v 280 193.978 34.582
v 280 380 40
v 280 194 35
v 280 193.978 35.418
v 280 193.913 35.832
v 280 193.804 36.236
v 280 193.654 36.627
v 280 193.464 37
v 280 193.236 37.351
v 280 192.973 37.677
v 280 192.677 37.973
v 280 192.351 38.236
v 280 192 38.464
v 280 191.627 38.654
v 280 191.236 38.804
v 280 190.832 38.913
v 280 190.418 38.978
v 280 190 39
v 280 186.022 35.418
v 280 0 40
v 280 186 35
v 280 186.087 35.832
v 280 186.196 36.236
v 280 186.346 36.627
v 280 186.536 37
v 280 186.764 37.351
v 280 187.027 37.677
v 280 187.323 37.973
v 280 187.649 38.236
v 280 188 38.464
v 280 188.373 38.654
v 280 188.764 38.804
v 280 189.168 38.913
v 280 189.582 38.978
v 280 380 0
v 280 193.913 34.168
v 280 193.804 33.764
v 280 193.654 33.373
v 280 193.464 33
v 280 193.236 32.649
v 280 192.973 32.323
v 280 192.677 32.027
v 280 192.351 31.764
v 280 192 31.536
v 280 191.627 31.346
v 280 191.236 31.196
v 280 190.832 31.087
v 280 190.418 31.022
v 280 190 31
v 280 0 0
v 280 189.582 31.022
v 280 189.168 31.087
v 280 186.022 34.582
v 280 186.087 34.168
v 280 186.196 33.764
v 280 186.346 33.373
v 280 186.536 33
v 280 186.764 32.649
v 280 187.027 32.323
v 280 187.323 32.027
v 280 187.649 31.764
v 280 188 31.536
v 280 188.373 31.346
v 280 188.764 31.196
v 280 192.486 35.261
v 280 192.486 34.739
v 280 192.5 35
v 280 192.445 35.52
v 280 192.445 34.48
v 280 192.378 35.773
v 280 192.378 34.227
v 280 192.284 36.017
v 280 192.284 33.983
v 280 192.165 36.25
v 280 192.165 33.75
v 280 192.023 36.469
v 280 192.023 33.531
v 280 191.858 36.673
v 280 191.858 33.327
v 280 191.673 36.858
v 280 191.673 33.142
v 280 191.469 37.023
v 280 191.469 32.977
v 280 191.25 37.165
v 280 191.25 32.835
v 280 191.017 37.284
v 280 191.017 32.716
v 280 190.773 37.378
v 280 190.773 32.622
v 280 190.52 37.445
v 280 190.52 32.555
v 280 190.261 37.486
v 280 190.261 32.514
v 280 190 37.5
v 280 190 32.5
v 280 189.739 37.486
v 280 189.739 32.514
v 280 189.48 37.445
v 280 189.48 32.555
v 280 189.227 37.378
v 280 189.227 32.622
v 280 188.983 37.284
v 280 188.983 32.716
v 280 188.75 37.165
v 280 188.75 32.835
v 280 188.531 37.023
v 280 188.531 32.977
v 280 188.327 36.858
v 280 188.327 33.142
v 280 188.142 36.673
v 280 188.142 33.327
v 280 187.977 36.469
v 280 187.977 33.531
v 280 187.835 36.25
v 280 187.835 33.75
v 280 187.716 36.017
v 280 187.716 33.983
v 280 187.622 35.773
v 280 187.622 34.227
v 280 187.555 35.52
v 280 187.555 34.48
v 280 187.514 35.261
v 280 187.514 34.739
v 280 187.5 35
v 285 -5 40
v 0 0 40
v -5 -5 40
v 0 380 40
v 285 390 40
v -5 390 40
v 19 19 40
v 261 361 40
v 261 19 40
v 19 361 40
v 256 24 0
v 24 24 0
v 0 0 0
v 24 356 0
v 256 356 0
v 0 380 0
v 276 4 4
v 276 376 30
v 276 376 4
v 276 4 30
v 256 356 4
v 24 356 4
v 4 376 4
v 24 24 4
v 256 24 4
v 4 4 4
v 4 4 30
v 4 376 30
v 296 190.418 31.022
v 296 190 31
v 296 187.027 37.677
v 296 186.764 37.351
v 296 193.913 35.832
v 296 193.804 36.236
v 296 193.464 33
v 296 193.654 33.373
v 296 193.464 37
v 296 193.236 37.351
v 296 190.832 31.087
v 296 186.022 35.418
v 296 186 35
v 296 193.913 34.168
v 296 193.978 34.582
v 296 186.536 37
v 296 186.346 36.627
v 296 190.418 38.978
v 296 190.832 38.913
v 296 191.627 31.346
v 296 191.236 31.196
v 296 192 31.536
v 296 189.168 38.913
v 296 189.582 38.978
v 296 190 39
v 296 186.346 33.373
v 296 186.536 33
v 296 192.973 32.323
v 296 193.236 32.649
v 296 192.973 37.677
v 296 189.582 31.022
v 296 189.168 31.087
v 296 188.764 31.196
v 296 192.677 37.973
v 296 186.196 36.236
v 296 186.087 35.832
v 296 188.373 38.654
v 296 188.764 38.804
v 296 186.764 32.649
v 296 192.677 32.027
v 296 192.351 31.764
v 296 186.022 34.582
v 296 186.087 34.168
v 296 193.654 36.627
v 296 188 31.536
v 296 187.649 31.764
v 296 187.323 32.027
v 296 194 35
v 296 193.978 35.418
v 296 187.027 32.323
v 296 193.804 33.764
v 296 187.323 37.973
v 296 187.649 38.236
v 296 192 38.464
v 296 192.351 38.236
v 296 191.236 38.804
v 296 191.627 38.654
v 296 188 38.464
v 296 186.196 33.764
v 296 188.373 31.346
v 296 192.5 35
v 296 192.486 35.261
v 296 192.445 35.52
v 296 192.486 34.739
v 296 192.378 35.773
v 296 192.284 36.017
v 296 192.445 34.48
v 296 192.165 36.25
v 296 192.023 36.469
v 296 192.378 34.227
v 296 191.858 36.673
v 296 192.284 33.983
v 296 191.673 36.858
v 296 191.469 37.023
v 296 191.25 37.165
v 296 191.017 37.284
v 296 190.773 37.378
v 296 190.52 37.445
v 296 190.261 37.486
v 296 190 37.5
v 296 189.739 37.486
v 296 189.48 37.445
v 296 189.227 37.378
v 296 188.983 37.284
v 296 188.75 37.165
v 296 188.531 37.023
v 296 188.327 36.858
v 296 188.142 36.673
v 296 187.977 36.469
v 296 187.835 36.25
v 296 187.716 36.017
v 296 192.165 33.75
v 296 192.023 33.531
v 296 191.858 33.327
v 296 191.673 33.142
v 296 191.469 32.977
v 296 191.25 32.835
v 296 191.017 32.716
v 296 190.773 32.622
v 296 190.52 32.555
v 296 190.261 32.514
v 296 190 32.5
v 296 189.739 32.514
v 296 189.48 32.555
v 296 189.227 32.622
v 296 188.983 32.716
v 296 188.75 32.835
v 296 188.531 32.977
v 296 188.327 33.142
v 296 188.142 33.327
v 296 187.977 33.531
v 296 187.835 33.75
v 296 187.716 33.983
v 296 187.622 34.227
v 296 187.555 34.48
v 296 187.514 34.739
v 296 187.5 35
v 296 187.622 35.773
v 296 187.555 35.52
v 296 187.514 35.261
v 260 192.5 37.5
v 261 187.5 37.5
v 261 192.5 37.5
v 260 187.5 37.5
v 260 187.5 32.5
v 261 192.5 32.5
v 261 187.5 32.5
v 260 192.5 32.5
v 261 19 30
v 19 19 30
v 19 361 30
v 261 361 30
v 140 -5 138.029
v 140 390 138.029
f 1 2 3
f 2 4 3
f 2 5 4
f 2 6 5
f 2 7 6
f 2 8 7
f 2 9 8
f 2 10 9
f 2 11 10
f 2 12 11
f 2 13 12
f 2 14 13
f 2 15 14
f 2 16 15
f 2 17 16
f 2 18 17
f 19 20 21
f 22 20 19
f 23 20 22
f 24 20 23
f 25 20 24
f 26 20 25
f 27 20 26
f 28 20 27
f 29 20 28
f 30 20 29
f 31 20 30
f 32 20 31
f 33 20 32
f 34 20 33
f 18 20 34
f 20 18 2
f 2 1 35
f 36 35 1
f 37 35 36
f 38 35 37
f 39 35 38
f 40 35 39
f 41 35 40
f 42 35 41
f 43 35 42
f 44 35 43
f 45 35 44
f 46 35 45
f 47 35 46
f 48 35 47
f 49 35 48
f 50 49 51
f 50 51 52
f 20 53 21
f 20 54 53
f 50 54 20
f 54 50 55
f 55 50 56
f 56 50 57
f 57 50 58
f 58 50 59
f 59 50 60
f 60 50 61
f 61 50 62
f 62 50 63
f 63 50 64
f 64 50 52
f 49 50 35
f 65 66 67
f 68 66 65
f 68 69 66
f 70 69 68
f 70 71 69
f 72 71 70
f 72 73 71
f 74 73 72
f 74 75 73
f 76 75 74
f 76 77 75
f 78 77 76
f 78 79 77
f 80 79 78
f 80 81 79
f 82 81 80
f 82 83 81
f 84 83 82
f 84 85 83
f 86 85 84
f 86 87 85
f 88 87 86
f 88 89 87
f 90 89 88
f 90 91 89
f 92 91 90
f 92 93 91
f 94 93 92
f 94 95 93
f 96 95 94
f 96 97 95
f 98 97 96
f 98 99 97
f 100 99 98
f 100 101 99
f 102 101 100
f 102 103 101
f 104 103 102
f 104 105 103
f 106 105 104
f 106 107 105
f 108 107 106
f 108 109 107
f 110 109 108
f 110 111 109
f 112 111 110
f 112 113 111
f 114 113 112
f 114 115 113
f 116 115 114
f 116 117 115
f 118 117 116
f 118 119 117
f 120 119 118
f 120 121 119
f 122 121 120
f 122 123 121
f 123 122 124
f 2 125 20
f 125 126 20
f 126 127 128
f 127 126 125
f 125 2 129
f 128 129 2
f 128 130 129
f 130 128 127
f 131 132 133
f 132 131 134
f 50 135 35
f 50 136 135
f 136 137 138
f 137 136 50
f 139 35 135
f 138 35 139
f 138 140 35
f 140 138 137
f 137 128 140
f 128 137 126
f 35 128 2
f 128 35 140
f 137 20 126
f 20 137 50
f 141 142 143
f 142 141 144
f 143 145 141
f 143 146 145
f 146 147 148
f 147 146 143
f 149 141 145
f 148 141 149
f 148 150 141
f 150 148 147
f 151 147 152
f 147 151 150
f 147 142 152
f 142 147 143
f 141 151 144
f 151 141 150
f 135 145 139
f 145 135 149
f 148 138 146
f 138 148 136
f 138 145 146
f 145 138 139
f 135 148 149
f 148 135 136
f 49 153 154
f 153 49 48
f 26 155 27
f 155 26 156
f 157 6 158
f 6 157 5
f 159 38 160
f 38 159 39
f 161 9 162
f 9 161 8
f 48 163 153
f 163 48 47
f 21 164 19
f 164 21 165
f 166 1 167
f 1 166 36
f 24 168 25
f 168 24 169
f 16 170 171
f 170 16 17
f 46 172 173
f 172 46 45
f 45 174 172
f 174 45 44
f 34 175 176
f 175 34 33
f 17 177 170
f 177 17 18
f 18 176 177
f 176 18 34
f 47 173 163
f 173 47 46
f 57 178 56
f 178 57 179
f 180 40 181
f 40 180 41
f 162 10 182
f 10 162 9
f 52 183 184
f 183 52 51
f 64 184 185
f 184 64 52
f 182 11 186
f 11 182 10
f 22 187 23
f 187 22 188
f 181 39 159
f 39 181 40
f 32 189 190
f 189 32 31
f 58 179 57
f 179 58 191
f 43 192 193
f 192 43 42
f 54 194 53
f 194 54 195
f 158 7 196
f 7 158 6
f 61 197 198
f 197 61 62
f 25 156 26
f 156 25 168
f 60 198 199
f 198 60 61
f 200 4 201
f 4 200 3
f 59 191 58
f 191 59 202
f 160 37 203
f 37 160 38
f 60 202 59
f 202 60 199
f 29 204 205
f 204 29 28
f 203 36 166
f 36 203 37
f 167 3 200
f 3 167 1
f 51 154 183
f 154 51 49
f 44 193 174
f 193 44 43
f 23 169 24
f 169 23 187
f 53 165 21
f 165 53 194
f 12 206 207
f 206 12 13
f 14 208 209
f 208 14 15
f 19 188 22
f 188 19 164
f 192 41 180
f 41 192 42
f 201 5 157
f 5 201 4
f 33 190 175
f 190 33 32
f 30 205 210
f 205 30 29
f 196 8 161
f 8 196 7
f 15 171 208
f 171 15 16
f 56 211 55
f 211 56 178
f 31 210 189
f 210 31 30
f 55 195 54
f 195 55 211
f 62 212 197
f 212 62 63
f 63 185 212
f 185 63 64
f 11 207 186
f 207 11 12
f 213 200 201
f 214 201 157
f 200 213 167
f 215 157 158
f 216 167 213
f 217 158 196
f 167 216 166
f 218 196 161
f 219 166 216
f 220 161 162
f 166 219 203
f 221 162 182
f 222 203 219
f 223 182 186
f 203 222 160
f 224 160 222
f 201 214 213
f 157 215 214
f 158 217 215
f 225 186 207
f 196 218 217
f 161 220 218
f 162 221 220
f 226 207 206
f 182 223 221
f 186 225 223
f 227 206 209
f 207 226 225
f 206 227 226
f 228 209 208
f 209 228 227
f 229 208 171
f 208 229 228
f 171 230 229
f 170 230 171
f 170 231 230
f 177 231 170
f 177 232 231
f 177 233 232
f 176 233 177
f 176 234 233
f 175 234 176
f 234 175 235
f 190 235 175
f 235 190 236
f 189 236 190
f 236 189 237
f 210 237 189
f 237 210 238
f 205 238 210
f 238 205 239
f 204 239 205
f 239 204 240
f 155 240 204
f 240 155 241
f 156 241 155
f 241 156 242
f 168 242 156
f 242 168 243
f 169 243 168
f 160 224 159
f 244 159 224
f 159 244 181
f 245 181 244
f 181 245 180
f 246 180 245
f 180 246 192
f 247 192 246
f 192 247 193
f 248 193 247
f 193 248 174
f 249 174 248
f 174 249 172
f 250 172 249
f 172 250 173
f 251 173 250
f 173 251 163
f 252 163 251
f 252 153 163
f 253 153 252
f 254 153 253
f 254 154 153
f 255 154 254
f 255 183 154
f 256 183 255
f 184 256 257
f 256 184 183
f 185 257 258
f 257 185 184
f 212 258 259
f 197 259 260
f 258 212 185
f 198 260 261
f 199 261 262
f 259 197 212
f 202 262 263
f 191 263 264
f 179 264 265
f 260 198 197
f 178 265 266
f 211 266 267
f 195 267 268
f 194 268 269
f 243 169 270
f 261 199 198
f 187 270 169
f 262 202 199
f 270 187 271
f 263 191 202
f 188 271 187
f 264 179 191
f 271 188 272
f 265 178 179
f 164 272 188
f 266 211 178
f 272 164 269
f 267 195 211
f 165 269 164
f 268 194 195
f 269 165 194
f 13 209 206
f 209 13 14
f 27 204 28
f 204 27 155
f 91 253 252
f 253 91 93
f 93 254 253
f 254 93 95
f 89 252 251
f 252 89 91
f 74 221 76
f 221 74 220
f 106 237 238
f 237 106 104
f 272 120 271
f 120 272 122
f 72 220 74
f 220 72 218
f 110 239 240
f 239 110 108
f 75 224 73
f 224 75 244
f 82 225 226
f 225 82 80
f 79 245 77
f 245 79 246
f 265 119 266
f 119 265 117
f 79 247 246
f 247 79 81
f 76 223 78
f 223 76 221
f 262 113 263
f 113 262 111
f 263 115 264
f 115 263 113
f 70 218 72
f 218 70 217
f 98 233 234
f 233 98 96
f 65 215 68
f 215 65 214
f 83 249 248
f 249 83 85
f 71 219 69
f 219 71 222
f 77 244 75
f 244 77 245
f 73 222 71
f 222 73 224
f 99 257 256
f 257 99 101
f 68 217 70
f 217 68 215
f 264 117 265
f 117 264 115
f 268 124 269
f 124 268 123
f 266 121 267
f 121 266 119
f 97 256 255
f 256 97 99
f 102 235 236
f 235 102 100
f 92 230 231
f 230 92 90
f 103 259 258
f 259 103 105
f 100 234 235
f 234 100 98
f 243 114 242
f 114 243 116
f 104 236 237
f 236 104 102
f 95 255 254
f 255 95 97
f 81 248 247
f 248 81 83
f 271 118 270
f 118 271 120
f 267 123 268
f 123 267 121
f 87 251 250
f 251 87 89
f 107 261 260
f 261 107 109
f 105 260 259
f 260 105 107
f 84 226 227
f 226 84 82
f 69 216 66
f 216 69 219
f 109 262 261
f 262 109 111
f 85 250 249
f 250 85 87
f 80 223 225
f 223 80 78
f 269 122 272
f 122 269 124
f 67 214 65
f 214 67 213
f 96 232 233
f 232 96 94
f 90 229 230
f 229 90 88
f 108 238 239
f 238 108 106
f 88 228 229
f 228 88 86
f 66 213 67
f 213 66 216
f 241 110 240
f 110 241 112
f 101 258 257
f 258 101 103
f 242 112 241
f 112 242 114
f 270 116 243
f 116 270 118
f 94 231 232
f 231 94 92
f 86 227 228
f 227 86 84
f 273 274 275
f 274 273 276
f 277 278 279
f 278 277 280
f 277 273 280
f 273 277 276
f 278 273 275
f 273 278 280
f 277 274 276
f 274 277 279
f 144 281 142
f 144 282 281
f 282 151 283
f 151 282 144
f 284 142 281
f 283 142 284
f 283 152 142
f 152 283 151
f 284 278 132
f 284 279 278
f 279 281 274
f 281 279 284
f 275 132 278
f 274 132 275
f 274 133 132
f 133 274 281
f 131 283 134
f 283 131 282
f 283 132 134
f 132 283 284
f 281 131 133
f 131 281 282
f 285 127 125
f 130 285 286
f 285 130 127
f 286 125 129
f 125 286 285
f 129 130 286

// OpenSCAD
/*
  Symbiotic Factory - Module I (SUN)
  Hardware: Parametric Interfacial Solar Steam Generator (ISSG) Housing
  License: CERN-OHL-S
  
  Description:
  This OpenSCAD script generates a customizable housing for the Plasmonic Biochar Sponge.
  It is designed to float on top of saltwater/wastewater.
  - The central "Sponge Tray" allows capillary wicking of water from below.
  - The angled "Condensation Roof" lets sunlight/UV in to power the LSPR evaporation,
    catches the rising steam, and channels the pure condensate into...
  - The "Distillate Gutters", which route the freshwater out to the WATER module.
*/

// --- Core Parameters (Customize to match your local saltwater tank dimensions) ---
$fn = 60; // Curve resolution

// Base Dimensions
tank_inner_width = 300.0;   // Inner width of your main saltwater reservoir (mm)
tank_inner_length = 400.0;  // Inner length of your main saltwater reservoir (mm)
tolerance_gap = 10.0;       // Gap around the housing so it floats freely (mm)

// Housing Dimensions
housing_w = tank_inner_width - (tolerance_gap * 2);
housing_l = tank_inner_length - (tolerance_gap * 2);
housing_wall_thickness = 4.0;
housing_base_height = 40.0; // Deep enough to act as a boat

// Sponge Tray (The central hole for the biochar)
// We leave a lip around the edge so the sponge doesn't fall through
tray_lip_width = 20.0;
sponge_w = housing_w - (tray_lip_width * 2) - (housing_wall_thickness * 2);
sponge_l = housing_l - (tray_lip_width * 2) - (housing_wall_thickness * 2);

// Condensation Gutter (Interior perimeter)
gutter_width = 15.0;
gutter_depth = 10.0;

// Roof Angles (Standard is 30-45 degrees to ensure drop roll-off before falling back in)
roof_angle = 35.0;
roof_overhang = 5.0;

// Output Port (To attach tubing to the algae cycloreactors)
output_pipe_outer_dia = 8.0;
output_pipe_inner_dia = 5.0;

// --- Module Generation ---

module floating_base() {
    difference() {
        // Main buoyant hull
        cube([housing_w, housing_l, housing_base_height]);
        
        // Hollow out the interior (leaving structural walls and the bottom lip)
        translate([housing_wall_thickness, housing_wall_thickness, housing_wall_thickness])
            cube([housing_w - (housing_wall_thickness*2), 
                  housing_l - (housing_wall_thickness*2), 
                  housing_base_height]);
                  
        // Cut out the central hole for the capillary sponge to touch the water
        translate([tray_lip_width + housing_wall_thickness, 
                   tray_lip_width + housing_wall_thickness, 
                   -1])
            cube([sponge_w, sponge_l, housing_wall_thickness + 2]);
    }
}

module condensation_gutters() {
    // Generate the internal trough that catches water rolling off the roof
    translate([housing_wall_thickness, housing_wall_thickness, housing_base_height - gutter_depth])
    difference() {
        // Solid rim
        cube([housing_w - (housing_wall_thickness*2), 
              housing_l - (housing_wall_thickness*2), 
              gutter_depth]);
              
        // Hollowed trough
        translate([gutter_width, gutter_width, 0])
             cube([housing_w - (housing_wall_thickness*2) - (gutter_width*2), 
                   housing_l - (housing_wall_thickness*2) - (gutter_width*2), 
                   gutter_depth + 1]);
    }
}

module output_spigot() {
    // Connects to the gutter to drain the freshwater
    translate([housing_w - housing_wall_thickness, 
               housing_l / 2, 
               housing_base_height - (gutter_depth / 2)])
    rotate([0, 90, 0])
    difference() {
        cylinder(h=20, d=output_pipe_outer_dia);
        translate([0,0,-1]) cylinder(h=22, d=output_pipe_inner_dia);
    }
    
    // Pierce the hull wall into the gutter
    translate([housing_w - housing_wall_thickness - gutter_width - 1, 
               (housing_l / 2) - (output_pipe_inner_dia / 2), 
               housing_base_height - (gutter_depth / 2) - (output_pipe_inner_dia / 2)])
        cube([gutter_width + 2, output_pipe_inner_dia, output_pipe_inner_dia]);
}

// NOTE: The transparent roof is usually cut from a flat sheet of Polycarbonate or Acrylic,
// not 3D printed (since FDM printing is never truly optically clear).
// We provide a solid 3D model here just as a cutting template or assembly reference.
module acrylic_roof_template() {
    roof_height = tan(roof_angle) * (housing_w / 2);
    
    // Render as a translucent blue body to indicate glass/acrylic
    color([0.2, 0.5, 0.9, 0.4]) 
    translate([-roof_overhang, 0, housing_base_height])
    rotate([0, 0, 0])
    // Generate a prism (A-frame roof)
    polyhedron(
        points=[
            [0, -roof_overhang, 0], [housing_w + (roof_overhang*2), -roof_overhang, 0], 
            [housing_w + (roof_overhang*2), housing_l + (roof_overhang*2), 0], [0, housing_l + (roof_overhang*2), 0], // Base corners
            [(housing_w/2) + roof_overhang, -roof_overhang, roof_height], [(housing_w/2) + roof_overhang, housing_l + (roof_overhang*2), roof_height]  // Peak line
        ],
        faces=[
            [0,3,2,1], // Bottom
            [0,1,4],   // Front Triangle
            [3,0,4,5], // Left slope
            [1,2,5,4], // Right slope
            [2,3,5]    // Back Triangle
        ]
    );
}

// Assemble the printable parts
module export_printable_housing() {
    union() {
        difference() {
            floating_base();
            output_spigot(); // Cut hole for spigot
        }
        condensation_gutters();
        output_spigot();
    }
}

// Choose what to render (Uncomment for export)
export_printable_housing();

// Display the transparent roof for assembly context (Do not export this for 3D printing)
acrylic_roof_template();
